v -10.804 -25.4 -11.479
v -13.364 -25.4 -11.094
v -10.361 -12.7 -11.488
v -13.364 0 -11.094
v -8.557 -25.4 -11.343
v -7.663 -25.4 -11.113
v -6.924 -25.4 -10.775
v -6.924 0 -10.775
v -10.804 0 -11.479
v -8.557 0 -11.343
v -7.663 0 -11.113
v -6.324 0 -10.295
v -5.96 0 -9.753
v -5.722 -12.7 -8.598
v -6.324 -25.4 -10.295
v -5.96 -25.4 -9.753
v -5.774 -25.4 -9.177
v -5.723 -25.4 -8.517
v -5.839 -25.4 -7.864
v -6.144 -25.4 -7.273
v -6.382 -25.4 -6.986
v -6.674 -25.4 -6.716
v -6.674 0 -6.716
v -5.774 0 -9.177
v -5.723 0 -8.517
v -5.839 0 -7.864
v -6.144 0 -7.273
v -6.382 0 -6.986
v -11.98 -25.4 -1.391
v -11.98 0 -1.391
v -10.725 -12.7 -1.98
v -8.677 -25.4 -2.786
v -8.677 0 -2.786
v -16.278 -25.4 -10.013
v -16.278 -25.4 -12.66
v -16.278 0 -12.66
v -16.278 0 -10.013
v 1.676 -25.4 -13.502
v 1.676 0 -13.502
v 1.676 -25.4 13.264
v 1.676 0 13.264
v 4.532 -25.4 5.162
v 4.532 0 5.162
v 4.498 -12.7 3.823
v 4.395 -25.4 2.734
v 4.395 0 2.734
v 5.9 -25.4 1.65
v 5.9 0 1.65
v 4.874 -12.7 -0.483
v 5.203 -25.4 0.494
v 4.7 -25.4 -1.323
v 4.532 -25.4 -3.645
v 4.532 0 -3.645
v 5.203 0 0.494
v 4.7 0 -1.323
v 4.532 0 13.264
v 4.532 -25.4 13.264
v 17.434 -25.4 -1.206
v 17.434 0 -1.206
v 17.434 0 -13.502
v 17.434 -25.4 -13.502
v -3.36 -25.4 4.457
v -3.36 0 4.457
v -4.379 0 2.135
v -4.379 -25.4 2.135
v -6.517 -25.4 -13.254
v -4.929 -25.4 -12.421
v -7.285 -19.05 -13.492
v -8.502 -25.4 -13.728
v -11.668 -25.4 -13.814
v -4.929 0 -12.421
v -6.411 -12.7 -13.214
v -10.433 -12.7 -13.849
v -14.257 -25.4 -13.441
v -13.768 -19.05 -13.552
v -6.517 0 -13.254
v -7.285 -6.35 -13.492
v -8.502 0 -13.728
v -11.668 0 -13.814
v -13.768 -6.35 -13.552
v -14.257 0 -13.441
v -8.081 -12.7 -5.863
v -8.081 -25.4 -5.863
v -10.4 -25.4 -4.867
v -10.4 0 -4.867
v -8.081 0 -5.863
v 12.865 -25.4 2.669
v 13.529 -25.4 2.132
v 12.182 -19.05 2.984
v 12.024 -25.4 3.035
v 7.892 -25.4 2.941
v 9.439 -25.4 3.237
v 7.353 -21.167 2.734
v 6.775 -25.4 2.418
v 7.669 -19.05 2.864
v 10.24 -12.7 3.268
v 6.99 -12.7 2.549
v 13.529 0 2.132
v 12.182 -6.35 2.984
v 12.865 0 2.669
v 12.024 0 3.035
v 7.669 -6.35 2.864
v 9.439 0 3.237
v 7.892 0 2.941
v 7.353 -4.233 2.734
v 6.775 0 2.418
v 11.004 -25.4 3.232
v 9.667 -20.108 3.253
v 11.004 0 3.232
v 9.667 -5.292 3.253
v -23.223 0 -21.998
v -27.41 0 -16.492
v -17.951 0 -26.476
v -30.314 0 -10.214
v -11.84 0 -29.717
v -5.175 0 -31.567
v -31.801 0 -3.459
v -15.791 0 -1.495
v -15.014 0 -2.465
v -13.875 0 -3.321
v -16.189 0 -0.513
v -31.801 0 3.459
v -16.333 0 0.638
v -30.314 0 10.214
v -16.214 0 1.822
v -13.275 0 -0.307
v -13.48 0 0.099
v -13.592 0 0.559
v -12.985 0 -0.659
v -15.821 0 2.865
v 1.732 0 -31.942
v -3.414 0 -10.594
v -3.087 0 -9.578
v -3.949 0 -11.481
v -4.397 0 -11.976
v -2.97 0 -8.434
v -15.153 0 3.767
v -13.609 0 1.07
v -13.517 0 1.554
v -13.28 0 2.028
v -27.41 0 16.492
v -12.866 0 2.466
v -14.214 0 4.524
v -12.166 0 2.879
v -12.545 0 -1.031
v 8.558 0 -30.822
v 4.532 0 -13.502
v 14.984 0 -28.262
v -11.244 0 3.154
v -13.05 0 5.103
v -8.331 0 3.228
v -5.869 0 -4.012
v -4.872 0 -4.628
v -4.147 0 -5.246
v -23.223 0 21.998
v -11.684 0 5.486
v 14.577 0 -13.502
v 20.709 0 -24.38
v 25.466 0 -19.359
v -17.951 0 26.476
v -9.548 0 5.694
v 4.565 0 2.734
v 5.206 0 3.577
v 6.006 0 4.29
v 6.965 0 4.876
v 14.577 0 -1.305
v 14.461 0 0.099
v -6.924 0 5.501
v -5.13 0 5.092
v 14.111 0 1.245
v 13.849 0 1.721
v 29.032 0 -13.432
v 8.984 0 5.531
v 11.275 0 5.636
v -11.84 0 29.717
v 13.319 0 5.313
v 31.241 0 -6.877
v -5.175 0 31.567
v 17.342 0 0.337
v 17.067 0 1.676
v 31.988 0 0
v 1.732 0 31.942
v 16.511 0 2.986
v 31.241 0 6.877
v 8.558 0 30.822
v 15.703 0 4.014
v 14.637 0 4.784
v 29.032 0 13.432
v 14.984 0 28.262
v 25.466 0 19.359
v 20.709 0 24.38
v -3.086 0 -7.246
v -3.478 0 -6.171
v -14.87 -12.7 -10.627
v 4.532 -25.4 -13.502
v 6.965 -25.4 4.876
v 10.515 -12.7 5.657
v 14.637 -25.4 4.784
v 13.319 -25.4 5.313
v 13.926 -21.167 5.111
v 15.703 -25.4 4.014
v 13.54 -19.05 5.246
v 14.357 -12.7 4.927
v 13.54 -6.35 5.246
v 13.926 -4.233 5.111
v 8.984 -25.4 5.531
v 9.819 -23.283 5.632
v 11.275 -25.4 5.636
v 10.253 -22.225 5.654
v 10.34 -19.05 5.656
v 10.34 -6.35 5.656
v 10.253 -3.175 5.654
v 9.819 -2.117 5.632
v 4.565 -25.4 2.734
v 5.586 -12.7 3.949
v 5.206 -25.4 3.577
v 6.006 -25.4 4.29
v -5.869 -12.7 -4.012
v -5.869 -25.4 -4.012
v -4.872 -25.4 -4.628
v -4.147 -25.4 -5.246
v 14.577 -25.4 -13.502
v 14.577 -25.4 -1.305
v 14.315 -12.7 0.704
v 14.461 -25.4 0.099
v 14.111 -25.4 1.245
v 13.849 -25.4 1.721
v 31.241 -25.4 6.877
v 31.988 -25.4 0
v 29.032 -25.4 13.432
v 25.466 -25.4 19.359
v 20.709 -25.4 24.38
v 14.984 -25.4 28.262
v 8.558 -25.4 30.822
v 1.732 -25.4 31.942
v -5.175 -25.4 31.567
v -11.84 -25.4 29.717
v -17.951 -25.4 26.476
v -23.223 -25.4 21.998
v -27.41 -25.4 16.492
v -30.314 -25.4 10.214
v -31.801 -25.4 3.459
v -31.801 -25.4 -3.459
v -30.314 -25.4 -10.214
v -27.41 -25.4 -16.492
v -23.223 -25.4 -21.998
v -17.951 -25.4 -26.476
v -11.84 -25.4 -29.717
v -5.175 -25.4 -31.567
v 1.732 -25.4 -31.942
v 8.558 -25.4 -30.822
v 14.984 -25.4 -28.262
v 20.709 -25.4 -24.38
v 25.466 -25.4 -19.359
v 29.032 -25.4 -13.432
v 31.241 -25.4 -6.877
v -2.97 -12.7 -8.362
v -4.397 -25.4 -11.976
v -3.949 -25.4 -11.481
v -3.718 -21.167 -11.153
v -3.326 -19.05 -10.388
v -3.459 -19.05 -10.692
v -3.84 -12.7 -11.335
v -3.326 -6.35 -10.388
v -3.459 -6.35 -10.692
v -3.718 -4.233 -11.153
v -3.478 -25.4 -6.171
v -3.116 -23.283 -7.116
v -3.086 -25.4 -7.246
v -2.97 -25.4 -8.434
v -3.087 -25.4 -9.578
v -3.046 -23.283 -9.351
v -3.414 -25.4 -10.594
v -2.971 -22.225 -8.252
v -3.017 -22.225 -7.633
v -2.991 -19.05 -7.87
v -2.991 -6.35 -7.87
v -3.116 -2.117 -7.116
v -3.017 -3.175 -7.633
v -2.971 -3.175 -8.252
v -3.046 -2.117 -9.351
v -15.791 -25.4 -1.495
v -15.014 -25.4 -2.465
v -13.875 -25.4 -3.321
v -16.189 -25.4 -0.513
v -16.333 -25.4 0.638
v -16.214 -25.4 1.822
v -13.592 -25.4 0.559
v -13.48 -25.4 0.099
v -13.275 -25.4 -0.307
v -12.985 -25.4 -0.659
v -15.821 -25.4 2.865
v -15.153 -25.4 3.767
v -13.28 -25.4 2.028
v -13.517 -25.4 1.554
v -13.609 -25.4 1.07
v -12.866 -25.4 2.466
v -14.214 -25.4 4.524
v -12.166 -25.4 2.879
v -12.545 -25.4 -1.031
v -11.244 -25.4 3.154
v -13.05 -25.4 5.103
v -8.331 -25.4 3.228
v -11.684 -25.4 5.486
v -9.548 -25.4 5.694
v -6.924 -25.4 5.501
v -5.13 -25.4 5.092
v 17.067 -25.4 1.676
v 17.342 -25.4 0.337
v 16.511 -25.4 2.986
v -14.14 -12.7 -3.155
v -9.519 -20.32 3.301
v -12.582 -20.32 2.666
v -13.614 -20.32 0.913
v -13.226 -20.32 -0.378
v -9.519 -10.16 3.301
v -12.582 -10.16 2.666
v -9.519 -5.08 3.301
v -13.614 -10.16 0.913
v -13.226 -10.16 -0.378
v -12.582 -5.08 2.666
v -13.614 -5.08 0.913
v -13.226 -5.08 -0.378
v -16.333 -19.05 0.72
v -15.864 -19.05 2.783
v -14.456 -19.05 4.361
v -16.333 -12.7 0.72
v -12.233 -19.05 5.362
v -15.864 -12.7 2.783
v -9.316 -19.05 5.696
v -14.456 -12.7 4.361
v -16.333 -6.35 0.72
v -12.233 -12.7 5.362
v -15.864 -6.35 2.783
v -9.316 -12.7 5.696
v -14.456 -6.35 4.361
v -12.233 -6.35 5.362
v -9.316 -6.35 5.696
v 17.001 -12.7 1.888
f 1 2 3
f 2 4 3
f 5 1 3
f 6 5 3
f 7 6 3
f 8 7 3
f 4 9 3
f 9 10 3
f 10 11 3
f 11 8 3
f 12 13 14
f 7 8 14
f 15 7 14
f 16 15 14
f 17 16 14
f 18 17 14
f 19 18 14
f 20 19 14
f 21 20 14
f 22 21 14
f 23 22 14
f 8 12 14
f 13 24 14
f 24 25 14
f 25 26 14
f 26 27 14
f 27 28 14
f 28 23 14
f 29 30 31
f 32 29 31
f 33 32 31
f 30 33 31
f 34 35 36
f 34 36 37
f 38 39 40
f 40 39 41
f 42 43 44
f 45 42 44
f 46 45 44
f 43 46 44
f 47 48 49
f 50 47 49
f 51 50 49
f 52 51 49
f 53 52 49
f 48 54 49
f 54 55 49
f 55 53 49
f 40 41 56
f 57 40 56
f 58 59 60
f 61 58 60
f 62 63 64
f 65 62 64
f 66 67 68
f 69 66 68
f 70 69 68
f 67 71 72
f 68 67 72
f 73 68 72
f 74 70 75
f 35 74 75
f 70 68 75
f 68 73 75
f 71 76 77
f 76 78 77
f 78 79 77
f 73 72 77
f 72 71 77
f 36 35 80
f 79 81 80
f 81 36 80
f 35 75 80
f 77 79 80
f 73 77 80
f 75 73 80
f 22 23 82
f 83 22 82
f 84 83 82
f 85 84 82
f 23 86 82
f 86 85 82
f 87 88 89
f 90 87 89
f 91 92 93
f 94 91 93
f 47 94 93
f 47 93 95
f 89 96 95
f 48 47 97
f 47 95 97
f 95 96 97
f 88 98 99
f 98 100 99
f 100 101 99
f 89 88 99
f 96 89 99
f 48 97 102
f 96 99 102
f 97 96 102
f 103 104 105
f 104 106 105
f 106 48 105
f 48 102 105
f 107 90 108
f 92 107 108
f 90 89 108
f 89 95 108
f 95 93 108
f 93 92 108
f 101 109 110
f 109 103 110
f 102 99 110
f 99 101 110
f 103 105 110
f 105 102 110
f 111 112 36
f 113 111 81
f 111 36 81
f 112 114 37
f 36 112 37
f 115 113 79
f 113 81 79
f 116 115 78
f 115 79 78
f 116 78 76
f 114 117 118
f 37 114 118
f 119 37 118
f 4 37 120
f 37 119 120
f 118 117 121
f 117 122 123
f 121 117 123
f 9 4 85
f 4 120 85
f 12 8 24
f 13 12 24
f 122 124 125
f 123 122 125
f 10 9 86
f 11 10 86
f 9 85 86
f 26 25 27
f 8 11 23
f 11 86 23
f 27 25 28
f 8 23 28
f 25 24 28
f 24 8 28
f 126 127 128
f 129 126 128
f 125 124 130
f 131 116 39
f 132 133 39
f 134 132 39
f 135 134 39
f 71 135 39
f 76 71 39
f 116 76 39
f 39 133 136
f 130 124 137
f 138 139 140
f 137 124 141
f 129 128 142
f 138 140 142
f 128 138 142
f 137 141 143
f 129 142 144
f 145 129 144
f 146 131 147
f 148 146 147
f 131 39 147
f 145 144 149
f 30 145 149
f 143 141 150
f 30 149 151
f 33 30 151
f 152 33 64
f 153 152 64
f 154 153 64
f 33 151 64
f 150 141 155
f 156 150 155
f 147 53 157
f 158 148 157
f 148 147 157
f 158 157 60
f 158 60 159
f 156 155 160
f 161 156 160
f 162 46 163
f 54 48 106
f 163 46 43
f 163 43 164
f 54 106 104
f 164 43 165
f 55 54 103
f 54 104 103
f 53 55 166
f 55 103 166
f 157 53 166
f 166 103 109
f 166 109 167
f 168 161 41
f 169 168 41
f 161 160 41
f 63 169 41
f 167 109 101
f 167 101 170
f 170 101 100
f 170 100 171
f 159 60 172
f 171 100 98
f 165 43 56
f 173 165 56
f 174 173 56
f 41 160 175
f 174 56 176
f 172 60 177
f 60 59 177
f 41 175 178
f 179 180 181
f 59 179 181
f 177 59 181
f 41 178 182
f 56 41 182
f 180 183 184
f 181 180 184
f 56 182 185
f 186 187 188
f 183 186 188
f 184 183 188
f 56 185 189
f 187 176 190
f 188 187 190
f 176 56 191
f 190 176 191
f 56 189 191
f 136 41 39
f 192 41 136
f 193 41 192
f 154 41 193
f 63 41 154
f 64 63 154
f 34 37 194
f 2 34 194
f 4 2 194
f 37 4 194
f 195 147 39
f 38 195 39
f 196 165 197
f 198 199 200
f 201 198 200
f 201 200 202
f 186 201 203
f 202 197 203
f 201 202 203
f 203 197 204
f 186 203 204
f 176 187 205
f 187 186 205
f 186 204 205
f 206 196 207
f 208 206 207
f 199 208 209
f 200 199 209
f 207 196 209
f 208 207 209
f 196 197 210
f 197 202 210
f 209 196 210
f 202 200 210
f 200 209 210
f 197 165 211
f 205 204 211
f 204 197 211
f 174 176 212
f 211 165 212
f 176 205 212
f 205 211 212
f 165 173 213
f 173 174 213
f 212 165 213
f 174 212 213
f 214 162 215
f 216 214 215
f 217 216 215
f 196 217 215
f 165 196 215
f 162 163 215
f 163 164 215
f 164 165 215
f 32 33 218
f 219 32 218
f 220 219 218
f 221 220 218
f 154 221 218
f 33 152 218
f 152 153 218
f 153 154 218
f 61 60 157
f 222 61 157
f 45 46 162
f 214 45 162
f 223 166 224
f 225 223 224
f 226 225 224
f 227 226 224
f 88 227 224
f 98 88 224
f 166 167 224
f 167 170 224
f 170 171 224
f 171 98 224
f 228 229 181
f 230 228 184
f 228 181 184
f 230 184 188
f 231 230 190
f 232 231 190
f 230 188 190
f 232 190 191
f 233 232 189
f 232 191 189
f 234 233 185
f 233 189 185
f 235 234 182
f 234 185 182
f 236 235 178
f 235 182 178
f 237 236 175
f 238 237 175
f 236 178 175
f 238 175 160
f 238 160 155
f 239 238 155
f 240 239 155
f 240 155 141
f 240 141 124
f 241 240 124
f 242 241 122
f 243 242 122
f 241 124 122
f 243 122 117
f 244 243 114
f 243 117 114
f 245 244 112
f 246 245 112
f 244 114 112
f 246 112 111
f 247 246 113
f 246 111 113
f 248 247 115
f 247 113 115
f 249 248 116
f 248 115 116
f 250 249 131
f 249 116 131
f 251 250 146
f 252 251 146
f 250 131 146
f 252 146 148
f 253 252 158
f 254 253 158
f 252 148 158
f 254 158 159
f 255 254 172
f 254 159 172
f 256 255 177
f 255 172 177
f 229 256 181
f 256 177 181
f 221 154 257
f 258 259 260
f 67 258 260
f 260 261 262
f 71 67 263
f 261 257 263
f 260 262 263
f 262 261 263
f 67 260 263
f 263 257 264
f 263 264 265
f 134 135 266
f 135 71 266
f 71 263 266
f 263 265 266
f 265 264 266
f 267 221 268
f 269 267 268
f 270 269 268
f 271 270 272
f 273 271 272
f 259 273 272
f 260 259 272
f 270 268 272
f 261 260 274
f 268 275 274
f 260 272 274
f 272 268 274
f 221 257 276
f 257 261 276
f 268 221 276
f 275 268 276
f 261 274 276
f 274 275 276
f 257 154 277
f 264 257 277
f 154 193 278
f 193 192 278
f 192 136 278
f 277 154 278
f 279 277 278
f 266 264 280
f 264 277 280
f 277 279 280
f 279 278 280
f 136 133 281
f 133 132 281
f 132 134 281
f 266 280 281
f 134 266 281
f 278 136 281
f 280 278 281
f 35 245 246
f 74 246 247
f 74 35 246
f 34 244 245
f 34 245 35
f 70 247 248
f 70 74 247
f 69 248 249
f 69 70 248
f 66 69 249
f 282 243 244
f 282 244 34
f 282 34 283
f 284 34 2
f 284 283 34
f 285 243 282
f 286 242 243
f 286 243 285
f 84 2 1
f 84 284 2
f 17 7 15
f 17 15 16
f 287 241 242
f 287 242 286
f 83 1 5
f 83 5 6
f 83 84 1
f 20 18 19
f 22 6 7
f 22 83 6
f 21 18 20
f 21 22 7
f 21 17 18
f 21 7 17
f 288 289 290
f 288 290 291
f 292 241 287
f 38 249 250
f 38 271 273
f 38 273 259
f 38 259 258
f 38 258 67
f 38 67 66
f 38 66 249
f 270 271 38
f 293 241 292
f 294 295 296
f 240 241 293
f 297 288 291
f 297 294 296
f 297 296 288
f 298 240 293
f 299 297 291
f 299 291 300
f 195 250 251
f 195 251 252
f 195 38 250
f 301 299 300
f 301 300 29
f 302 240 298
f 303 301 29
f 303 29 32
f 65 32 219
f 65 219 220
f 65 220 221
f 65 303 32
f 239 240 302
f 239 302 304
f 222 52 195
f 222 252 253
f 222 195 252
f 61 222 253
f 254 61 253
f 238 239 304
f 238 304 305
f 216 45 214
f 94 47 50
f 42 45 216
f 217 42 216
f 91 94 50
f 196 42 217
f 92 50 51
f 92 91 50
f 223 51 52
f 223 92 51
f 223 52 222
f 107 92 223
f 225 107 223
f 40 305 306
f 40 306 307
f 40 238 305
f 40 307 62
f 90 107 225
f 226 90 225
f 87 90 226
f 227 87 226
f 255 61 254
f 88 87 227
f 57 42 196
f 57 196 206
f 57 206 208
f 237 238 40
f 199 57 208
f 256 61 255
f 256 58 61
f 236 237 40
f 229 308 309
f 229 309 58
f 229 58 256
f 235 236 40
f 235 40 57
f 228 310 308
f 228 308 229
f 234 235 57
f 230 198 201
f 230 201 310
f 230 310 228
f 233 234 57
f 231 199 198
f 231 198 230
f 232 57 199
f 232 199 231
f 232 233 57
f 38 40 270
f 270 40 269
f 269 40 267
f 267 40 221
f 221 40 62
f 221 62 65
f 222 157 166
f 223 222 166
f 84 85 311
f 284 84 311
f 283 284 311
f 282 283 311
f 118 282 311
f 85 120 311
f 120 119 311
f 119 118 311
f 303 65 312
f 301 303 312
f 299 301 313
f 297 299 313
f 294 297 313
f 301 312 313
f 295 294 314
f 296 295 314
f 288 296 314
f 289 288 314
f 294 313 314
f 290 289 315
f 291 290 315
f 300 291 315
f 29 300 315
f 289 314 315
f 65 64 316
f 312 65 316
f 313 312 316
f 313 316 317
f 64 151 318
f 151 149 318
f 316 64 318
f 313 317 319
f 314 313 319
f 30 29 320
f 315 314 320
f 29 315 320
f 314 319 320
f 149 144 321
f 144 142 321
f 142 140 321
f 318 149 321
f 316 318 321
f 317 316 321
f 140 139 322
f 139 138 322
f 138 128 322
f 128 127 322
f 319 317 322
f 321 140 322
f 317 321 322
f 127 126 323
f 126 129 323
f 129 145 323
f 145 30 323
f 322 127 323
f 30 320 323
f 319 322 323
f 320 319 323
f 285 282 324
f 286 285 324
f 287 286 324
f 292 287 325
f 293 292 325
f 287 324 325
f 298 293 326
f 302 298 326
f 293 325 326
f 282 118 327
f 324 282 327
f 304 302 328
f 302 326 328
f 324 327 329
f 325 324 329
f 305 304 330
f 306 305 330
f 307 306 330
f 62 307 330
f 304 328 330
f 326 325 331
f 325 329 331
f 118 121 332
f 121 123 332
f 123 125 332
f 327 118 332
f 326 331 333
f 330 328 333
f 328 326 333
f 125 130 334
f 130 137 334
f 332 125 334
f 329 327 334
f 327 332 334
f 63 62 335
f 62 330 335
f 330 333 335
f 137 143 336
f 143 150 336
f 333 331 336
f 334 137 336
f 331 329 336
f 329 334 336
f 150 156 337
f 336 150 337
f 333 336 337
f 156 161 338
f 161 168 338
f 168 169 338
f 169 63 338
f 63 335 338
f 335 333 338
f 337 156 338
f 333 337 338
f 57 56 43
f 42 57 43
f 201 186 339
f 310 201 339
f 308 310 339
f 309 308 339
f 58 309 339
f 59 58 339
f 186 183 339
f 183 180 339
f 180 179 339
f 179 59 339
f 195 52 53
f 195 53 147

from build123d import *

# Parameters (mm, degrees)
F0_R     = 31.9884370587
F1_DEPTH = 25.4


with BuildPart() as f1:
    # F0 (on Front) → F1 (new body)
    with BuildSketch(Plane.XZ):
        Circle(F0_R)
        with BuildLine():
            add(Edge.make_bspline(
                [(-4.1474287559, -5.2462848568), (-2.9695766051, -6.4846808097), (-2.9695766051, -8.3615386761)],
                knots=[0, 0, 0, 1, 1, 1], degree=2))
            add(Edge.make_bspline(
                [(-2.9695766051, -8.3615386761), (-2.9695766051, -10.9924420782), (-4.9289942017, -12.4207254106)],
                knots=[0, 0, 0, 1, 1, 1], degree=2))
            add(Edge.make_bspline(
                [(-4.9289942017, -12.4207254106), (-6.8884117983, -13.8490087429), (-10.4329762146, -13.8490087429)],
                knots=[0, 0, 0, 1, 1, 1], degree=2))
            add(Edge.make_bspline(
                [(-10.4329762146, -13.8490087429), (-14.1811879653, -13.8490087429), (-16.2782051122, -12.6601486281)],
                knots=[0, 0, 0, 1, 1, 1], degree=2))
            Line((-16.2782051122, -12.6601486281), (-16.2782051122, -10.0127332799))
            add(Edge.make_bspline(
                [(-16.2782051122, -10.0127332799), (-14.9187215551, -10.7007310315), (-13.3638466364, -11.0942657455)],
                knots=[0, 0, 0, 1, 1, 1], degree=2))
            add(Edge.make_bspline(
                [(-13.3638466364, -11.0942657455), (-11.8089717178, -11.4878004594), (-10.3614244484, -11.4878004594)],
                knots=[0, 0, 0, 1, 1, 1], degree=2))
            add(Edge.make_bspline(
                [(-10.3614244484, -11.4878004594), (-8.1268077512, -11.4878004594), (-6.9241876814, -10.7750347887)],
                knots=[0, 0, 0, 1, 1, 1], degree=2))
            add(Edge.make_bspline(
                [(-6.9241876814, -10.7750347887), (-5.7215676115, -10.0622691181), (-5.7215676115, -8.5982099026)],
                knots=[0, 0, 0, 1, 1, 1], degree=2))
            add(Edge.make_bspline(
                [(-5.7215676115, -8.5982099026), (-5.7215676115, -7.4974135001), (-6.6737564998, -6.7158480542)],
                knots=[0, 0, 0, 1, 1, 1], degree=2))
            add(Edge.make_bspline(
                [(-6.6737564998, -6.7158480542), (-7.625945388, -5.9342826084), (-10.3999523225, -4.8665100979)],
                knots=[0, 0, 0, 1, 1, 1], degree=2))
            add(Edge.make_bspline(
                [(-10.3999523225, -4.8665100979), (-13.0308557246, -3.8868012996), (-14.1399081002, -3.1547716919)],
                knots=[0, 0, 0, 1, 1, 1], degree=2))
            add(Edge.make_bspline(
                [(-14.1399081002, -3.1547716919), (-15.2489604758, -2.4227420842), (-15.7911027041, -1.495321115)],
                knots=[0, 0, 0, 1, 1, 1], degree=2))
            add(Edge.make_bspline(
                [(-15.7911027041, -1.495321115), (-16.3332449324, -0.5679001459), (-16.3332449324, 0.7200316452)],
                knots=[0, 0, 0, 1, 1, 1], degree=2))
            add(Edge.make_bspline(
                [(-16.3332449324, 0.7200316452), (-16.3332449324, 3.0262001086), (-14.456387066, 4.3609157467)],
                knots=[0, 0, 0, 1, 1, 1], degree=2))
            add(Edge.make_bspline(
                [(-14.456387066, 4.3609157467), (-12.5795291996, 5.6956313848), (-9.3156678659, 5.6956313848)],
                knots=[0, 0, 0, 1, 1, 1], degree=2))
            add(Edge.make_bspline(
                [(-9.3156678659, 5.6956313848), (-6.2719658128, 5.6956313848), (-3.360359328, 4.4572354319)],
                knots=[0, 0, 0, 1, 1, 1], degree=2))
            Line((-3.360359328, 4.4572354319), (-4.3785960004, 2.1345550225))
            add(Edge.make_bspline(
                [(-4.3785960004, 2.1345550225), (-7.213146737, 3.3013992092), (-9.5193152004, 3.3013992092)],
                knots=[0, 0, 0, 1, 1, 1], degree=2))
            add(Edge.make_bspline(
                [(-9.5193152004, 3.3013992092), (-11.5502845632, 3.3013992092), (-12.5822811906, 2.6656892867)],
                knots=[0, 0, 0, 1, 1, 1], degree=2))
            add(Edge.make_bspline(
                [(-12.5822811906, 2.6656892867), (-13.614277818, 2.0299793642), (-13.614277818, 0.9126710156)],
                knots=[0, 0, 0, 1, 1, 1], degree=2))
            add(Edge.make_bspline(
                [(-13.614277818, 0.9126710156), (-13.614277818, 0.1531214978), (-13.2262470861, -0.3780127664)],
                knots=[0, 0, 0, 1, 1, 1], degree=2))
            add(Edge.make_bspline(
                [(-13.2262470861, -0.3780127664), (-12.8382163542, -0.9091470306), (-11.9795951602, -1.3907454568)],
                knots=[0, 0, 0, 1, 1, 1], degree=2))
            add(Edge.make_bspline(
                [(-11.9795951602, -1.3907454568), (-11.1209739662, -1.8723438829), (-8.6772059525, -2.786004897)],
                knots=[0, 0, 0, 1, 1, 1], degree=2))
            add(Edge.make_bspline(
                [(-8.6772059525, -2.786004897), (-5.3252809066, -4.0078889039), (-4.1474287559, -5.2462848568)],
                knots=[0, 0, 0, 1, 1, 1], degree=2))
        make_face(mode=Mode.SUBTRACT)
        with BuildLine():
            Line((17.4336847166, -13.5022578761), (14.5771180519, -13.5022578761))
            Line((14.5771180519, -13.5022578761), (14.5771180519, -1.3054337356))
            add(Edge.make_bspline(
                [(14.5771180519, -1.3054337356), (14.5771180519, 0.9952307458), (13.5286094785, 2.1318030315)],
                knots=[0, 0, 0, 1, 1, 1], degree=2))
            add(Edge.make_bspline(
                [(13.5286094785, 2.1318030315), (12.480100905, 3.2683753171), (10.2399802258, 3.2683753171)],
                knots=[0, 0, 0, 1, 1, 1], degree=2))
            add(Edge.make_bspline(
                [(10.2399802258, 3.2683753171), (7.2678299388, 3.2683753171), (5.9000904086, 1.6502046053)],
                knots=[0, 0, 0, 1, 1, 1], degree=2))
            add(Edge.make_bspline(
                [(5.9000904086, 1.6502046053), (4.5323508784, 0.0320338936), (4.5323508784, -3.644626091)],
                knots=[0, 0, 0, 1, 1, 1], degree=2))
            Line((4.5323508784, -3.644626091), (4.5323508784, -13.5022578761))
            Line((4.5323508784, -13.5022578761), (1.6757842138, -13.5022578761))
            Line((1.6757842138, -13.5022578761), (1.6757842138, 13.2636066525))
            Line((1.6757842138, 13.2636066525), (4.5323508784, 13.2636066525))
            Line((4.5323508784, 13.2636066525), (4.5323508784, 5.1617451295))
            add(Edge.make_bspline(
                [(4.5323508784, 5.1617451295), (4.5323508784, 3.6976859141), (4.3947513281, 2.7344890619)],
                knots=[0, 0, 0, 1, 1, 1], degree=2))
            Line((4.3947513281, 2.7344890619), (4.5653747705, 2.7344890619))
            add(Edge.make_bspline(
                [(4.5653747705, 2.7344890619), (5.4074840185, 4.0939726191), (6.9651109281, 4.8755380649)],
                knots=[0, 0, 0, 1, 1, 1], degree=2))
            add(Edge.make_bspline(
                [(6.9651109281, 4.8755380649), (8.5227378378, 5.6571035107), (10.5151793264, 5.6571035107)],
                knots=[0, 0, 0, 1, 1, 1], degree=2))
            add(Edge.make_bspline(
                [(10.5151793264, 5.6571035107), (13.9716800305, 5.6571035107), (15.7026823736, 4.0141648799)],
                knots=[0, 0, 0, 1, 1, 1], degree=2))
            add(Edge.make_bspline(
                [(15.7026823736, 4.0141648799), (17.4336847166, 2.371226249), (17.4336847166, -1.2063620593)],
                knots=[0, 0, 0, 1, 1, 1], degree=2))
            Line((17.4336847166, -1.2063620593), (17.4336847166, -13.5022578761))
        make_face(mode=Mode.SUBTRACT)
    extrude(amount=F1_DEPTH)


solid = f1.part
